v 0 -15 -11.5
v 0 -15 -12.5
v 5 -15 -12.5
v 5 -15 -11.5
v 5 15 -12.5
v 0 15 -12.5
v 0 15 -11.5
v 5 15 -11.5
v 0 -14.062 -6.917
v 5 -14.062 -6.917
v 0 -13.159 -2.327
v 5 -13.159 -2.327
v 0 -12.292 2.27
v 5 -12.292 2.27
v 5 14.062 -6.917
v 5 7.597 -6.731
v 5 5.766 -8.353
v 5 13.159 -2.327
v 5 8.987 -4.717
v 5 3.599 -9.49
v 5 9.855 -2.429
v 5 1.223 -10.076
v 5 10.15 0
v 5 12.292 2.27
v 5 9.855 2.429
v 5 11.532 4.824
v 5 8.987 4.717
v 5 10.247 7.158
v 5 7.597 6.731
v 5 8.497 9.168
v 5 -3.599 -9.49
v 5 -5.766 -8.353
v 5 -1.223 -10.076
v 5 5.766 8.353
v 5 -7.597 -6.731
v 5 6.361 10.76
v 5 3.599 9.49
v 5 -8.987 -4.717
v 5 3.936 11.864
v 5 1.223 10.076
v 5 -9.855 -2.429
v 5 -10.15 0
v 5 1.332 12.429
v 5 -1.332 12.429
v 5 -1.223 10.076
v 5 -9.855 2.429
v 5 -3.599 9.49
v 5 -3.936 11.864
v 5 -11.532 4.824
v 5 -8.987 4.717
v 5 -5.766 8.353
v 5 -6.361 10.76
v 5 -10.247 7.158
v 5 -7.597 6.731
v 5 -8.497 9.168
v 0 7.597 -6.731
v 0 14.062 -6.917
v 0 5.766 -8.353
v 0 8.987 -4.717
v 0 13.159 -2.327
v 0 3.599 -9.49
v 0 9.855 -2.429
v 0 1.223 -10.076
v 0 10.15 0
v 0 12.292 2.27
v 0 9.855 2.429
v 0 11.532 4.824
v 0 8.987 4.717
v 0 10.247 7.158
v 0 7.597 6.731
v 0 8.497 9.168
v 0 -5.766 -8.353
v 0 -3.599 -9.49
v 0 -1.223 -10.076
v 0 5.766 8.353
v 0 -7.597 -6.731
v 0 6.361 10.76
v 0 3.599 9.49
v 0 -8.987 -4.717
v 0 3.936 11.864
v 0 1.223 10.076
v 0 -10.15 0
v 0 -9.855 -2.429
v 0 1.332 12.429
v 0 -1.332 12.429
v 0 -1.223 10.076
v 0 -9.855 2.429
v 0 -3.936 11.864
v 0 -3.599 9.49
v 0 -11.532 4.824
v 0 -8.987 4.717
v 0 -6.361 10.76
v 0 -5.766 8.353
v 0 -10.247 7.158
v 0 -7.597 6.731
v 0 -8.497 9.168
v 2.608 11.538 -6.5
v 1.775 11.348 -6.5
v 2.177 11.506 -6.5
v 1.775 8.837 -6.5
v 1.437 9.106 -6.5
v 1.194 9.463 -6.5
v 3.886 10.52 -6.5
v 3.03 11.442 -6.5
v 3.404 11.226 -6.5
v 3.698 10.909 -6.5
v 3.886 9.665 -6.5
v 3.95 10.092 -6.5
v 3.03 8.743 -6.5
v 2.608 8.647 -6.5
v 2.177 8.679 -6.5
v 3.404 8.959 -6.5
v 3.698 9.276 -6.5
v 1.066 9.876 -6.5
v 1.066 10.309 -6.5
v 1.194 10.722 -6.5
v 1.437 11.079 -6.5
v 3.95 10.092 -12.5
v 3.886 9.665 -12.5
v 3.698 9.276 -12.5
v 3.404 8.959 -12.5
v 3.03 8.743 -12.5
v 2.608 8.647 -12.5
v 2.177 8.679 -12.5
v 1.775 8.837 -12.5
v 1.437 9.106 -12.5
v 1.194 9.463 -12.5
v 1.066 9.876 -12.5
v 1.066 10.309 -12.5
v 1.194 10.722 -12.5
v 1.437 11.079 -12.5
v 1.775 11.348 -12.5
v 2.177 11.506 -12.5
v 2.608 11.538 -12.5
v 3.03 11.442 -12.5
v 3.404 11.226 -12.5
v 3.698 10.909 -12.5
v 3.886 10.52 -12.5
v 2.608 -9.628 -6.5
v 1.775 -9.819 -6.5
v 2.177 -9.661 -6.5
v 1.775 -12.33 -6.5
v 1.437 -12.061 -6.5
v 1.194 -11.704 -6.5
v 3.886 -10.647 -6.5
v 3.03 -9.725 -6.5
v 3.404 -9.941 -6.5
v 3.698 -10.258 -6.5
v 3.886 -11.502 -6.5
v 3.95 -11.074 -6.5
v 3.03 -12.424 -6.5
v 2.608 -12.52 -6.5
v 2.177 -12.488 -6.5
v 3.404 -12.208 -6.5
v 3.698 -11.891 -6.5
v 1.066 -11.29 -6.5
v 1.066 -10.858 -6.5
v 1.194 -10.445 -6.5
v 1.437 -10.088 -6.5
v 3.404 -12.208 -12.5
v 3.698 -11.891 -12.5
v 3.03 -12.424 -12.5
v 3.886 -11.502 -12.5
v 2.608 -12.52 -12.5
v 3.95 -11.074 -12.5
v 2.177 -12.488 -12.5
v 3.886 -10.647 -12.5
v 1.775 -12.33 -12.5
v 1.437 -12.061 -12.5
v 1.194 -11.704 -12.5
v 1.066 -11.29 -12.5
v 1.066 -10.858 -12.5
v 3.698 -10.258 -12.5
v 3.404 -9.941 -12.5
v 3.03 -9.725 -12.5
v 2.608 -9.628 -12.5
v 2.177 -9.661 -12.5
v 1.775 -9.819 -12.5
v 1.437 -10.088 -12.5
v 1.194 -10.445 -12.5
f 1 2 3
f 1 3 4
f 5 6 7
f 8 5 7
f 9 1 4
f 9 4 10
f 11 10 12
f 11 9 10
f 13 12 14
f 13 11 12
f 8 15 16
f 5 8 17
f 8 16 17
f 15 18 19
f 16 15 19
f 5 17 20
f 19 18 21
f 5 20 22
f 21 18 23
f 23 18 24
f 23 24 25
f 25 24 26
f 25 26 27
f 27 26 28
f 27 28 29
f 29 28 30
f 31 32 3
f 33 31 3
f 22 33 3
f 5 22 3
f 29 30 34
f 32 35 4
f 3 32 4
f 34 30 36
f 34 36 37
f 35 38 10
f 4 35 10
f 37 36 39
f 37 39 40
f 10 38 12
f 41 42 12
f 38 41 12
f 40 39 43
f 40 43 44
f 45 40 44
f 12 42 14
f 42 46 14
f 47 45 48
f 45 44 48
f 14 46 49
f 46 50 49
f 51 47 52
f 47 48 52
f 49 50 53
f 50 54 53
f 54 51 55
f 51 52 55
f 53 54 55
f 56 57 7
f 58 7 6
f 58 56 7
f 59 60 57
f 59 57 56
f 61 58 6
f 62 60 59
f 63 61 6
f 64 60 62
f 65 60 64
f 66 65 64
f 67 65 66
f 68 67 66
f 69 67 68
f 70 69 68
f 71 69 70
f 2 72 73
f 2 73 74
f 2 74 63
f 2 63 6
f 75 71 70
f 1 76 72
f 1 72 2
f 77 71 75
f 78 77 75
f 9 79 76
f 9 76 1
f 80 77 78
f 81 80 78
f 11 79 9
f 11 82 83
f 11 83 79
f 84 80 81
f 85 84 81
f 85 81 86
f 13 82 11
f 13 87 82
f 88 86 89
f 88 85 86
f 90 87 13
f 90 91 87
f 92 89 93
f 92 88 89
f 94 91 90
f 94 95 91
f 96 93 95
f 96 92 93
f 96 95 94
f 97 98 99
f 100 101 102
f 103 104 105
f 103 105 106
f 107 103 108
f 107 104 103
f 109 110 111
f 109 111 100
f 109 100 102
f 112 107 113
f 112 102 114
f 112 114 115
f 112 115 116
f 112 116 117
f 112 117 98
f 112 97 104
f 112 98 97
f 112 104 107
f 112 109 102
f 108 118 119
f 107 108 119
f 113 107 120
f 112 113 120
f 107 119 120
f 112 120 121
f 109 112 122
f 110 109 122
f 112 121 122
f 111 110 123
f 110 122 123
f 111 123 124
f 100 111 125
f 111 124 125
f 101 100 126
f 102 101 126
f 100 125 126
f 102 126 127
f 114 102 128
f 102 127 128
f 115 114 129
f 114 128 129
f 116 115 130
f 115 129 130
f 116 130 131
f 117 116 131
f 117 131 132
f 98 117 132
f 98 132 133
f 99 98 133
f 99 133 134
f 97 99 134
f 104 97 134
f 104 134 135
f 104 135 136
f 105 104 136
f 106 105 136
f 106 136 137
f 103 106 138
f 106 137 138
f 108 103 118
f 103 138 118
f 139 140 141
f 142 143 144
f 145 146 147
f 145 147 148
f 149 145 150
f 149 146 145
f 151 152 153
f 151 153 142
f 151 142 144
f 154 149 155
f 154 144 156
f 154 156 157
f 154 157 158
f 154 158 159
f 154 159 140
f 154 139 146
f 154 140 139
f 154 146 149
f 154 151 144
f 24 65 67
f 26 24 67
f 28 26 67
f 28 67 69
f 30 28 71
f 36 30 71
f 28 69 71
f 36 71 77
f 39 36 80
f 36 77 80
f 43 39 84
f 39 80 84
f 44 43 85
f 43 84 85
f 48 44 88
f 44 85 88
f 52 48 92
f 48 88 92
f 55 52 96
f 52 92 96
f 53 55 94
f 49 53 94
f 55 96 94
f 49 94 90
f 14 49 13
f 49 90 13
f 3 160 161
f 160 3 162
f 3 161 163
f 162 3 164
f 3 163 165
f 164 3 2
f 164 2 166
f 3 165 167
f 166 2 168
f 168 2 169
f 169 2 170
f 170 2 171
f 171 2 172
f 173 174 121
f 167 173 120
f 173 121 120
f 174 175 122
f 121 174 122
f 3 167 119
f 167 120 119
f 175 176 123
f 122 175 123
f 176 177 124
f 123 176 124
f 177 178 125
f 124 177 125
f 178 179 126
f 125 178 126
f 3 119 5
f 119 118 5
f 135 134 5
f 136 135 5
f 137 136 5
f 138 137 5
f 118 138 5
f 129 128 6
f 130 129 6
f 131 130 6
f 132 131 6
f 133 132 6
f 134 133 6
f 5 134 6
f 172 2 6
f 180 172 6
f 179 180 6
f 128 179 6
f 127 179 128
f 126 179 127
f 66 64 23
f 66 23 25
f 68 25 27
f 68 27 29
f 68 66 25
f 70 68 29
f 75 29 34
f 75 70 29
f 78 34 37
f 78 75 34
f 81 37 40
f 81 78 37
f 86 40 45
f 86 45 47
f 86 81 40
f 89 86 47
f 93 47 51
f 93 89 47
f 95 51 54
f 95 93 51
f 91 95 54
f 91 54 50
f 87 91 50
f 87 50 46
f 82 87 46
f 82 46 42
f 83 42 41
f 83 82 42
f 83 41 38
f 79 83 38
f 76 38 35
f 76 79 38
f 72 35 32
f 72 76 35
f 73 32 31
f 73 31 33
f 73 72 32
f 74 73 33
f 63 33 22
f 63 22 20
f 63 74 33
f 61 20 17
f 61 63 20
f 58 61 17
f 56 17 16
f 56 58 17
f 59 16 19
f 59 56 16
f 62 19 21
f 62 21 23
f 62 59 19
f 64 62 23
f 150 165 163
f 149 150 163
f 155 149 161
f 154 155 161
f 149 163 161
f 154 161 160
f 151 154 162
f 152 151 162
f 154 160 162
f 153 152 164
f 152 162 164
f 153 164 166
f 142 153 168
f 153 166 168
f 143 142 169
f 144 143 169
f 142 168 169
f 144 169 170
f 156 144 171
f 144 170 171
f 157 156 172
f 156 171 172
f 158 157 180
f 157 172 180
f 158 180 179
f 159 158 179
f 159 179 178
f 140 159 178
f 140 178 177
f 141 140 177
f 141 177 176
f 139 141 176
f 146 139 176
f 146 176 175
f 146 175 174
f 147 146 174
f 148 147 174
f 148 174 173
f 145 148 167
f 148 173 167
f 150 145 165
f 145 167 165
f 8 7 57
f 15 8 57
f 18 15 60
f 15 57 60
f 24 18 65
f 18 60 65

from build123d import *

# Parameters (mm, degrees)
F0_R        = 10.15
F0_W        = 30
F0_H        = 1
F1_DEPTH    = 5
F2_T1_DEPTH = 5
F3_R        = 1.45
F4_DEPTH    = 6


# Not quite as in the source:
# - a fillet or chamfer that OpenCascade refuses, or shapes differently, is made with other operations: its cross-section is extruded or revolved along the edge and cut away or added


with BuildPart() as f1:
    # F0 (on Right) → F1 (new body)
    with BuildSketch(Plane.YZ):
        with BuildLine():
            Line((15, -11.5), (12.5, 0))
            ThreePointArc((12.5, 0), (0, 12.5), (-12.5, 0))
            Line((-12.5, 0), (-15, -11.5))
            Line((-15, -11.5), (15, -11.5))
        make_face()
        Circle(F0_R, mode=Mode.SUBTRACT)
        with Locations((0, -12)):
            Rectangle(F0_W, F0_H)
    extrude(amount=F1_DEPTH)

    # F2: fillet of radius 608.1441737805 on 2 edges, made by hand

    # F2_s2 → F2_t1 (join)
    with BuildSketch(Plane.YZ):
        with BuildLine():
            ThreePointArc((-15, -11.5), (-13.6063343728, -4.6226980795), (-12.2921141837, 2.2702266177))
            ThreePointArc((-12.2921141837, 2.2702266177), (-12.4479200531, 1.1398624268), (-12.5, 0))
            Line((-12.5, 0), (-15, -11.5))
        make_face()
        with BuildLine():
            ThreePointArc((15, -11.5), (13.6063343728, -4.6226980795), (12.2921141837, 2.2702266177))
            ThreePointArc((12.2921141837, 2.2702266177), (12.4479200531, 1.1398624268), (12.5, 0))
            Line((12.5, 0), (15, -11.5))
        make_face()
    extrude(amount=F2_T1_DEPTH)

    # F3 (on face) → F4 (cut)
    with BuildSketch(Plane(origin=(0, 0, -12.5), x_dir=(1, 0, 0), z_dir=(0, 0, -1))):
        with Locations((2.4999999441, 11.0743809491)):
            Circle(F3_R)
        with Locations((2.5, -10.09248567)):
            Circle(F3_R)
    extrude(amount=-F4_DEPTH, mode=Mode.SUBTRACT)


solid = f1.part
